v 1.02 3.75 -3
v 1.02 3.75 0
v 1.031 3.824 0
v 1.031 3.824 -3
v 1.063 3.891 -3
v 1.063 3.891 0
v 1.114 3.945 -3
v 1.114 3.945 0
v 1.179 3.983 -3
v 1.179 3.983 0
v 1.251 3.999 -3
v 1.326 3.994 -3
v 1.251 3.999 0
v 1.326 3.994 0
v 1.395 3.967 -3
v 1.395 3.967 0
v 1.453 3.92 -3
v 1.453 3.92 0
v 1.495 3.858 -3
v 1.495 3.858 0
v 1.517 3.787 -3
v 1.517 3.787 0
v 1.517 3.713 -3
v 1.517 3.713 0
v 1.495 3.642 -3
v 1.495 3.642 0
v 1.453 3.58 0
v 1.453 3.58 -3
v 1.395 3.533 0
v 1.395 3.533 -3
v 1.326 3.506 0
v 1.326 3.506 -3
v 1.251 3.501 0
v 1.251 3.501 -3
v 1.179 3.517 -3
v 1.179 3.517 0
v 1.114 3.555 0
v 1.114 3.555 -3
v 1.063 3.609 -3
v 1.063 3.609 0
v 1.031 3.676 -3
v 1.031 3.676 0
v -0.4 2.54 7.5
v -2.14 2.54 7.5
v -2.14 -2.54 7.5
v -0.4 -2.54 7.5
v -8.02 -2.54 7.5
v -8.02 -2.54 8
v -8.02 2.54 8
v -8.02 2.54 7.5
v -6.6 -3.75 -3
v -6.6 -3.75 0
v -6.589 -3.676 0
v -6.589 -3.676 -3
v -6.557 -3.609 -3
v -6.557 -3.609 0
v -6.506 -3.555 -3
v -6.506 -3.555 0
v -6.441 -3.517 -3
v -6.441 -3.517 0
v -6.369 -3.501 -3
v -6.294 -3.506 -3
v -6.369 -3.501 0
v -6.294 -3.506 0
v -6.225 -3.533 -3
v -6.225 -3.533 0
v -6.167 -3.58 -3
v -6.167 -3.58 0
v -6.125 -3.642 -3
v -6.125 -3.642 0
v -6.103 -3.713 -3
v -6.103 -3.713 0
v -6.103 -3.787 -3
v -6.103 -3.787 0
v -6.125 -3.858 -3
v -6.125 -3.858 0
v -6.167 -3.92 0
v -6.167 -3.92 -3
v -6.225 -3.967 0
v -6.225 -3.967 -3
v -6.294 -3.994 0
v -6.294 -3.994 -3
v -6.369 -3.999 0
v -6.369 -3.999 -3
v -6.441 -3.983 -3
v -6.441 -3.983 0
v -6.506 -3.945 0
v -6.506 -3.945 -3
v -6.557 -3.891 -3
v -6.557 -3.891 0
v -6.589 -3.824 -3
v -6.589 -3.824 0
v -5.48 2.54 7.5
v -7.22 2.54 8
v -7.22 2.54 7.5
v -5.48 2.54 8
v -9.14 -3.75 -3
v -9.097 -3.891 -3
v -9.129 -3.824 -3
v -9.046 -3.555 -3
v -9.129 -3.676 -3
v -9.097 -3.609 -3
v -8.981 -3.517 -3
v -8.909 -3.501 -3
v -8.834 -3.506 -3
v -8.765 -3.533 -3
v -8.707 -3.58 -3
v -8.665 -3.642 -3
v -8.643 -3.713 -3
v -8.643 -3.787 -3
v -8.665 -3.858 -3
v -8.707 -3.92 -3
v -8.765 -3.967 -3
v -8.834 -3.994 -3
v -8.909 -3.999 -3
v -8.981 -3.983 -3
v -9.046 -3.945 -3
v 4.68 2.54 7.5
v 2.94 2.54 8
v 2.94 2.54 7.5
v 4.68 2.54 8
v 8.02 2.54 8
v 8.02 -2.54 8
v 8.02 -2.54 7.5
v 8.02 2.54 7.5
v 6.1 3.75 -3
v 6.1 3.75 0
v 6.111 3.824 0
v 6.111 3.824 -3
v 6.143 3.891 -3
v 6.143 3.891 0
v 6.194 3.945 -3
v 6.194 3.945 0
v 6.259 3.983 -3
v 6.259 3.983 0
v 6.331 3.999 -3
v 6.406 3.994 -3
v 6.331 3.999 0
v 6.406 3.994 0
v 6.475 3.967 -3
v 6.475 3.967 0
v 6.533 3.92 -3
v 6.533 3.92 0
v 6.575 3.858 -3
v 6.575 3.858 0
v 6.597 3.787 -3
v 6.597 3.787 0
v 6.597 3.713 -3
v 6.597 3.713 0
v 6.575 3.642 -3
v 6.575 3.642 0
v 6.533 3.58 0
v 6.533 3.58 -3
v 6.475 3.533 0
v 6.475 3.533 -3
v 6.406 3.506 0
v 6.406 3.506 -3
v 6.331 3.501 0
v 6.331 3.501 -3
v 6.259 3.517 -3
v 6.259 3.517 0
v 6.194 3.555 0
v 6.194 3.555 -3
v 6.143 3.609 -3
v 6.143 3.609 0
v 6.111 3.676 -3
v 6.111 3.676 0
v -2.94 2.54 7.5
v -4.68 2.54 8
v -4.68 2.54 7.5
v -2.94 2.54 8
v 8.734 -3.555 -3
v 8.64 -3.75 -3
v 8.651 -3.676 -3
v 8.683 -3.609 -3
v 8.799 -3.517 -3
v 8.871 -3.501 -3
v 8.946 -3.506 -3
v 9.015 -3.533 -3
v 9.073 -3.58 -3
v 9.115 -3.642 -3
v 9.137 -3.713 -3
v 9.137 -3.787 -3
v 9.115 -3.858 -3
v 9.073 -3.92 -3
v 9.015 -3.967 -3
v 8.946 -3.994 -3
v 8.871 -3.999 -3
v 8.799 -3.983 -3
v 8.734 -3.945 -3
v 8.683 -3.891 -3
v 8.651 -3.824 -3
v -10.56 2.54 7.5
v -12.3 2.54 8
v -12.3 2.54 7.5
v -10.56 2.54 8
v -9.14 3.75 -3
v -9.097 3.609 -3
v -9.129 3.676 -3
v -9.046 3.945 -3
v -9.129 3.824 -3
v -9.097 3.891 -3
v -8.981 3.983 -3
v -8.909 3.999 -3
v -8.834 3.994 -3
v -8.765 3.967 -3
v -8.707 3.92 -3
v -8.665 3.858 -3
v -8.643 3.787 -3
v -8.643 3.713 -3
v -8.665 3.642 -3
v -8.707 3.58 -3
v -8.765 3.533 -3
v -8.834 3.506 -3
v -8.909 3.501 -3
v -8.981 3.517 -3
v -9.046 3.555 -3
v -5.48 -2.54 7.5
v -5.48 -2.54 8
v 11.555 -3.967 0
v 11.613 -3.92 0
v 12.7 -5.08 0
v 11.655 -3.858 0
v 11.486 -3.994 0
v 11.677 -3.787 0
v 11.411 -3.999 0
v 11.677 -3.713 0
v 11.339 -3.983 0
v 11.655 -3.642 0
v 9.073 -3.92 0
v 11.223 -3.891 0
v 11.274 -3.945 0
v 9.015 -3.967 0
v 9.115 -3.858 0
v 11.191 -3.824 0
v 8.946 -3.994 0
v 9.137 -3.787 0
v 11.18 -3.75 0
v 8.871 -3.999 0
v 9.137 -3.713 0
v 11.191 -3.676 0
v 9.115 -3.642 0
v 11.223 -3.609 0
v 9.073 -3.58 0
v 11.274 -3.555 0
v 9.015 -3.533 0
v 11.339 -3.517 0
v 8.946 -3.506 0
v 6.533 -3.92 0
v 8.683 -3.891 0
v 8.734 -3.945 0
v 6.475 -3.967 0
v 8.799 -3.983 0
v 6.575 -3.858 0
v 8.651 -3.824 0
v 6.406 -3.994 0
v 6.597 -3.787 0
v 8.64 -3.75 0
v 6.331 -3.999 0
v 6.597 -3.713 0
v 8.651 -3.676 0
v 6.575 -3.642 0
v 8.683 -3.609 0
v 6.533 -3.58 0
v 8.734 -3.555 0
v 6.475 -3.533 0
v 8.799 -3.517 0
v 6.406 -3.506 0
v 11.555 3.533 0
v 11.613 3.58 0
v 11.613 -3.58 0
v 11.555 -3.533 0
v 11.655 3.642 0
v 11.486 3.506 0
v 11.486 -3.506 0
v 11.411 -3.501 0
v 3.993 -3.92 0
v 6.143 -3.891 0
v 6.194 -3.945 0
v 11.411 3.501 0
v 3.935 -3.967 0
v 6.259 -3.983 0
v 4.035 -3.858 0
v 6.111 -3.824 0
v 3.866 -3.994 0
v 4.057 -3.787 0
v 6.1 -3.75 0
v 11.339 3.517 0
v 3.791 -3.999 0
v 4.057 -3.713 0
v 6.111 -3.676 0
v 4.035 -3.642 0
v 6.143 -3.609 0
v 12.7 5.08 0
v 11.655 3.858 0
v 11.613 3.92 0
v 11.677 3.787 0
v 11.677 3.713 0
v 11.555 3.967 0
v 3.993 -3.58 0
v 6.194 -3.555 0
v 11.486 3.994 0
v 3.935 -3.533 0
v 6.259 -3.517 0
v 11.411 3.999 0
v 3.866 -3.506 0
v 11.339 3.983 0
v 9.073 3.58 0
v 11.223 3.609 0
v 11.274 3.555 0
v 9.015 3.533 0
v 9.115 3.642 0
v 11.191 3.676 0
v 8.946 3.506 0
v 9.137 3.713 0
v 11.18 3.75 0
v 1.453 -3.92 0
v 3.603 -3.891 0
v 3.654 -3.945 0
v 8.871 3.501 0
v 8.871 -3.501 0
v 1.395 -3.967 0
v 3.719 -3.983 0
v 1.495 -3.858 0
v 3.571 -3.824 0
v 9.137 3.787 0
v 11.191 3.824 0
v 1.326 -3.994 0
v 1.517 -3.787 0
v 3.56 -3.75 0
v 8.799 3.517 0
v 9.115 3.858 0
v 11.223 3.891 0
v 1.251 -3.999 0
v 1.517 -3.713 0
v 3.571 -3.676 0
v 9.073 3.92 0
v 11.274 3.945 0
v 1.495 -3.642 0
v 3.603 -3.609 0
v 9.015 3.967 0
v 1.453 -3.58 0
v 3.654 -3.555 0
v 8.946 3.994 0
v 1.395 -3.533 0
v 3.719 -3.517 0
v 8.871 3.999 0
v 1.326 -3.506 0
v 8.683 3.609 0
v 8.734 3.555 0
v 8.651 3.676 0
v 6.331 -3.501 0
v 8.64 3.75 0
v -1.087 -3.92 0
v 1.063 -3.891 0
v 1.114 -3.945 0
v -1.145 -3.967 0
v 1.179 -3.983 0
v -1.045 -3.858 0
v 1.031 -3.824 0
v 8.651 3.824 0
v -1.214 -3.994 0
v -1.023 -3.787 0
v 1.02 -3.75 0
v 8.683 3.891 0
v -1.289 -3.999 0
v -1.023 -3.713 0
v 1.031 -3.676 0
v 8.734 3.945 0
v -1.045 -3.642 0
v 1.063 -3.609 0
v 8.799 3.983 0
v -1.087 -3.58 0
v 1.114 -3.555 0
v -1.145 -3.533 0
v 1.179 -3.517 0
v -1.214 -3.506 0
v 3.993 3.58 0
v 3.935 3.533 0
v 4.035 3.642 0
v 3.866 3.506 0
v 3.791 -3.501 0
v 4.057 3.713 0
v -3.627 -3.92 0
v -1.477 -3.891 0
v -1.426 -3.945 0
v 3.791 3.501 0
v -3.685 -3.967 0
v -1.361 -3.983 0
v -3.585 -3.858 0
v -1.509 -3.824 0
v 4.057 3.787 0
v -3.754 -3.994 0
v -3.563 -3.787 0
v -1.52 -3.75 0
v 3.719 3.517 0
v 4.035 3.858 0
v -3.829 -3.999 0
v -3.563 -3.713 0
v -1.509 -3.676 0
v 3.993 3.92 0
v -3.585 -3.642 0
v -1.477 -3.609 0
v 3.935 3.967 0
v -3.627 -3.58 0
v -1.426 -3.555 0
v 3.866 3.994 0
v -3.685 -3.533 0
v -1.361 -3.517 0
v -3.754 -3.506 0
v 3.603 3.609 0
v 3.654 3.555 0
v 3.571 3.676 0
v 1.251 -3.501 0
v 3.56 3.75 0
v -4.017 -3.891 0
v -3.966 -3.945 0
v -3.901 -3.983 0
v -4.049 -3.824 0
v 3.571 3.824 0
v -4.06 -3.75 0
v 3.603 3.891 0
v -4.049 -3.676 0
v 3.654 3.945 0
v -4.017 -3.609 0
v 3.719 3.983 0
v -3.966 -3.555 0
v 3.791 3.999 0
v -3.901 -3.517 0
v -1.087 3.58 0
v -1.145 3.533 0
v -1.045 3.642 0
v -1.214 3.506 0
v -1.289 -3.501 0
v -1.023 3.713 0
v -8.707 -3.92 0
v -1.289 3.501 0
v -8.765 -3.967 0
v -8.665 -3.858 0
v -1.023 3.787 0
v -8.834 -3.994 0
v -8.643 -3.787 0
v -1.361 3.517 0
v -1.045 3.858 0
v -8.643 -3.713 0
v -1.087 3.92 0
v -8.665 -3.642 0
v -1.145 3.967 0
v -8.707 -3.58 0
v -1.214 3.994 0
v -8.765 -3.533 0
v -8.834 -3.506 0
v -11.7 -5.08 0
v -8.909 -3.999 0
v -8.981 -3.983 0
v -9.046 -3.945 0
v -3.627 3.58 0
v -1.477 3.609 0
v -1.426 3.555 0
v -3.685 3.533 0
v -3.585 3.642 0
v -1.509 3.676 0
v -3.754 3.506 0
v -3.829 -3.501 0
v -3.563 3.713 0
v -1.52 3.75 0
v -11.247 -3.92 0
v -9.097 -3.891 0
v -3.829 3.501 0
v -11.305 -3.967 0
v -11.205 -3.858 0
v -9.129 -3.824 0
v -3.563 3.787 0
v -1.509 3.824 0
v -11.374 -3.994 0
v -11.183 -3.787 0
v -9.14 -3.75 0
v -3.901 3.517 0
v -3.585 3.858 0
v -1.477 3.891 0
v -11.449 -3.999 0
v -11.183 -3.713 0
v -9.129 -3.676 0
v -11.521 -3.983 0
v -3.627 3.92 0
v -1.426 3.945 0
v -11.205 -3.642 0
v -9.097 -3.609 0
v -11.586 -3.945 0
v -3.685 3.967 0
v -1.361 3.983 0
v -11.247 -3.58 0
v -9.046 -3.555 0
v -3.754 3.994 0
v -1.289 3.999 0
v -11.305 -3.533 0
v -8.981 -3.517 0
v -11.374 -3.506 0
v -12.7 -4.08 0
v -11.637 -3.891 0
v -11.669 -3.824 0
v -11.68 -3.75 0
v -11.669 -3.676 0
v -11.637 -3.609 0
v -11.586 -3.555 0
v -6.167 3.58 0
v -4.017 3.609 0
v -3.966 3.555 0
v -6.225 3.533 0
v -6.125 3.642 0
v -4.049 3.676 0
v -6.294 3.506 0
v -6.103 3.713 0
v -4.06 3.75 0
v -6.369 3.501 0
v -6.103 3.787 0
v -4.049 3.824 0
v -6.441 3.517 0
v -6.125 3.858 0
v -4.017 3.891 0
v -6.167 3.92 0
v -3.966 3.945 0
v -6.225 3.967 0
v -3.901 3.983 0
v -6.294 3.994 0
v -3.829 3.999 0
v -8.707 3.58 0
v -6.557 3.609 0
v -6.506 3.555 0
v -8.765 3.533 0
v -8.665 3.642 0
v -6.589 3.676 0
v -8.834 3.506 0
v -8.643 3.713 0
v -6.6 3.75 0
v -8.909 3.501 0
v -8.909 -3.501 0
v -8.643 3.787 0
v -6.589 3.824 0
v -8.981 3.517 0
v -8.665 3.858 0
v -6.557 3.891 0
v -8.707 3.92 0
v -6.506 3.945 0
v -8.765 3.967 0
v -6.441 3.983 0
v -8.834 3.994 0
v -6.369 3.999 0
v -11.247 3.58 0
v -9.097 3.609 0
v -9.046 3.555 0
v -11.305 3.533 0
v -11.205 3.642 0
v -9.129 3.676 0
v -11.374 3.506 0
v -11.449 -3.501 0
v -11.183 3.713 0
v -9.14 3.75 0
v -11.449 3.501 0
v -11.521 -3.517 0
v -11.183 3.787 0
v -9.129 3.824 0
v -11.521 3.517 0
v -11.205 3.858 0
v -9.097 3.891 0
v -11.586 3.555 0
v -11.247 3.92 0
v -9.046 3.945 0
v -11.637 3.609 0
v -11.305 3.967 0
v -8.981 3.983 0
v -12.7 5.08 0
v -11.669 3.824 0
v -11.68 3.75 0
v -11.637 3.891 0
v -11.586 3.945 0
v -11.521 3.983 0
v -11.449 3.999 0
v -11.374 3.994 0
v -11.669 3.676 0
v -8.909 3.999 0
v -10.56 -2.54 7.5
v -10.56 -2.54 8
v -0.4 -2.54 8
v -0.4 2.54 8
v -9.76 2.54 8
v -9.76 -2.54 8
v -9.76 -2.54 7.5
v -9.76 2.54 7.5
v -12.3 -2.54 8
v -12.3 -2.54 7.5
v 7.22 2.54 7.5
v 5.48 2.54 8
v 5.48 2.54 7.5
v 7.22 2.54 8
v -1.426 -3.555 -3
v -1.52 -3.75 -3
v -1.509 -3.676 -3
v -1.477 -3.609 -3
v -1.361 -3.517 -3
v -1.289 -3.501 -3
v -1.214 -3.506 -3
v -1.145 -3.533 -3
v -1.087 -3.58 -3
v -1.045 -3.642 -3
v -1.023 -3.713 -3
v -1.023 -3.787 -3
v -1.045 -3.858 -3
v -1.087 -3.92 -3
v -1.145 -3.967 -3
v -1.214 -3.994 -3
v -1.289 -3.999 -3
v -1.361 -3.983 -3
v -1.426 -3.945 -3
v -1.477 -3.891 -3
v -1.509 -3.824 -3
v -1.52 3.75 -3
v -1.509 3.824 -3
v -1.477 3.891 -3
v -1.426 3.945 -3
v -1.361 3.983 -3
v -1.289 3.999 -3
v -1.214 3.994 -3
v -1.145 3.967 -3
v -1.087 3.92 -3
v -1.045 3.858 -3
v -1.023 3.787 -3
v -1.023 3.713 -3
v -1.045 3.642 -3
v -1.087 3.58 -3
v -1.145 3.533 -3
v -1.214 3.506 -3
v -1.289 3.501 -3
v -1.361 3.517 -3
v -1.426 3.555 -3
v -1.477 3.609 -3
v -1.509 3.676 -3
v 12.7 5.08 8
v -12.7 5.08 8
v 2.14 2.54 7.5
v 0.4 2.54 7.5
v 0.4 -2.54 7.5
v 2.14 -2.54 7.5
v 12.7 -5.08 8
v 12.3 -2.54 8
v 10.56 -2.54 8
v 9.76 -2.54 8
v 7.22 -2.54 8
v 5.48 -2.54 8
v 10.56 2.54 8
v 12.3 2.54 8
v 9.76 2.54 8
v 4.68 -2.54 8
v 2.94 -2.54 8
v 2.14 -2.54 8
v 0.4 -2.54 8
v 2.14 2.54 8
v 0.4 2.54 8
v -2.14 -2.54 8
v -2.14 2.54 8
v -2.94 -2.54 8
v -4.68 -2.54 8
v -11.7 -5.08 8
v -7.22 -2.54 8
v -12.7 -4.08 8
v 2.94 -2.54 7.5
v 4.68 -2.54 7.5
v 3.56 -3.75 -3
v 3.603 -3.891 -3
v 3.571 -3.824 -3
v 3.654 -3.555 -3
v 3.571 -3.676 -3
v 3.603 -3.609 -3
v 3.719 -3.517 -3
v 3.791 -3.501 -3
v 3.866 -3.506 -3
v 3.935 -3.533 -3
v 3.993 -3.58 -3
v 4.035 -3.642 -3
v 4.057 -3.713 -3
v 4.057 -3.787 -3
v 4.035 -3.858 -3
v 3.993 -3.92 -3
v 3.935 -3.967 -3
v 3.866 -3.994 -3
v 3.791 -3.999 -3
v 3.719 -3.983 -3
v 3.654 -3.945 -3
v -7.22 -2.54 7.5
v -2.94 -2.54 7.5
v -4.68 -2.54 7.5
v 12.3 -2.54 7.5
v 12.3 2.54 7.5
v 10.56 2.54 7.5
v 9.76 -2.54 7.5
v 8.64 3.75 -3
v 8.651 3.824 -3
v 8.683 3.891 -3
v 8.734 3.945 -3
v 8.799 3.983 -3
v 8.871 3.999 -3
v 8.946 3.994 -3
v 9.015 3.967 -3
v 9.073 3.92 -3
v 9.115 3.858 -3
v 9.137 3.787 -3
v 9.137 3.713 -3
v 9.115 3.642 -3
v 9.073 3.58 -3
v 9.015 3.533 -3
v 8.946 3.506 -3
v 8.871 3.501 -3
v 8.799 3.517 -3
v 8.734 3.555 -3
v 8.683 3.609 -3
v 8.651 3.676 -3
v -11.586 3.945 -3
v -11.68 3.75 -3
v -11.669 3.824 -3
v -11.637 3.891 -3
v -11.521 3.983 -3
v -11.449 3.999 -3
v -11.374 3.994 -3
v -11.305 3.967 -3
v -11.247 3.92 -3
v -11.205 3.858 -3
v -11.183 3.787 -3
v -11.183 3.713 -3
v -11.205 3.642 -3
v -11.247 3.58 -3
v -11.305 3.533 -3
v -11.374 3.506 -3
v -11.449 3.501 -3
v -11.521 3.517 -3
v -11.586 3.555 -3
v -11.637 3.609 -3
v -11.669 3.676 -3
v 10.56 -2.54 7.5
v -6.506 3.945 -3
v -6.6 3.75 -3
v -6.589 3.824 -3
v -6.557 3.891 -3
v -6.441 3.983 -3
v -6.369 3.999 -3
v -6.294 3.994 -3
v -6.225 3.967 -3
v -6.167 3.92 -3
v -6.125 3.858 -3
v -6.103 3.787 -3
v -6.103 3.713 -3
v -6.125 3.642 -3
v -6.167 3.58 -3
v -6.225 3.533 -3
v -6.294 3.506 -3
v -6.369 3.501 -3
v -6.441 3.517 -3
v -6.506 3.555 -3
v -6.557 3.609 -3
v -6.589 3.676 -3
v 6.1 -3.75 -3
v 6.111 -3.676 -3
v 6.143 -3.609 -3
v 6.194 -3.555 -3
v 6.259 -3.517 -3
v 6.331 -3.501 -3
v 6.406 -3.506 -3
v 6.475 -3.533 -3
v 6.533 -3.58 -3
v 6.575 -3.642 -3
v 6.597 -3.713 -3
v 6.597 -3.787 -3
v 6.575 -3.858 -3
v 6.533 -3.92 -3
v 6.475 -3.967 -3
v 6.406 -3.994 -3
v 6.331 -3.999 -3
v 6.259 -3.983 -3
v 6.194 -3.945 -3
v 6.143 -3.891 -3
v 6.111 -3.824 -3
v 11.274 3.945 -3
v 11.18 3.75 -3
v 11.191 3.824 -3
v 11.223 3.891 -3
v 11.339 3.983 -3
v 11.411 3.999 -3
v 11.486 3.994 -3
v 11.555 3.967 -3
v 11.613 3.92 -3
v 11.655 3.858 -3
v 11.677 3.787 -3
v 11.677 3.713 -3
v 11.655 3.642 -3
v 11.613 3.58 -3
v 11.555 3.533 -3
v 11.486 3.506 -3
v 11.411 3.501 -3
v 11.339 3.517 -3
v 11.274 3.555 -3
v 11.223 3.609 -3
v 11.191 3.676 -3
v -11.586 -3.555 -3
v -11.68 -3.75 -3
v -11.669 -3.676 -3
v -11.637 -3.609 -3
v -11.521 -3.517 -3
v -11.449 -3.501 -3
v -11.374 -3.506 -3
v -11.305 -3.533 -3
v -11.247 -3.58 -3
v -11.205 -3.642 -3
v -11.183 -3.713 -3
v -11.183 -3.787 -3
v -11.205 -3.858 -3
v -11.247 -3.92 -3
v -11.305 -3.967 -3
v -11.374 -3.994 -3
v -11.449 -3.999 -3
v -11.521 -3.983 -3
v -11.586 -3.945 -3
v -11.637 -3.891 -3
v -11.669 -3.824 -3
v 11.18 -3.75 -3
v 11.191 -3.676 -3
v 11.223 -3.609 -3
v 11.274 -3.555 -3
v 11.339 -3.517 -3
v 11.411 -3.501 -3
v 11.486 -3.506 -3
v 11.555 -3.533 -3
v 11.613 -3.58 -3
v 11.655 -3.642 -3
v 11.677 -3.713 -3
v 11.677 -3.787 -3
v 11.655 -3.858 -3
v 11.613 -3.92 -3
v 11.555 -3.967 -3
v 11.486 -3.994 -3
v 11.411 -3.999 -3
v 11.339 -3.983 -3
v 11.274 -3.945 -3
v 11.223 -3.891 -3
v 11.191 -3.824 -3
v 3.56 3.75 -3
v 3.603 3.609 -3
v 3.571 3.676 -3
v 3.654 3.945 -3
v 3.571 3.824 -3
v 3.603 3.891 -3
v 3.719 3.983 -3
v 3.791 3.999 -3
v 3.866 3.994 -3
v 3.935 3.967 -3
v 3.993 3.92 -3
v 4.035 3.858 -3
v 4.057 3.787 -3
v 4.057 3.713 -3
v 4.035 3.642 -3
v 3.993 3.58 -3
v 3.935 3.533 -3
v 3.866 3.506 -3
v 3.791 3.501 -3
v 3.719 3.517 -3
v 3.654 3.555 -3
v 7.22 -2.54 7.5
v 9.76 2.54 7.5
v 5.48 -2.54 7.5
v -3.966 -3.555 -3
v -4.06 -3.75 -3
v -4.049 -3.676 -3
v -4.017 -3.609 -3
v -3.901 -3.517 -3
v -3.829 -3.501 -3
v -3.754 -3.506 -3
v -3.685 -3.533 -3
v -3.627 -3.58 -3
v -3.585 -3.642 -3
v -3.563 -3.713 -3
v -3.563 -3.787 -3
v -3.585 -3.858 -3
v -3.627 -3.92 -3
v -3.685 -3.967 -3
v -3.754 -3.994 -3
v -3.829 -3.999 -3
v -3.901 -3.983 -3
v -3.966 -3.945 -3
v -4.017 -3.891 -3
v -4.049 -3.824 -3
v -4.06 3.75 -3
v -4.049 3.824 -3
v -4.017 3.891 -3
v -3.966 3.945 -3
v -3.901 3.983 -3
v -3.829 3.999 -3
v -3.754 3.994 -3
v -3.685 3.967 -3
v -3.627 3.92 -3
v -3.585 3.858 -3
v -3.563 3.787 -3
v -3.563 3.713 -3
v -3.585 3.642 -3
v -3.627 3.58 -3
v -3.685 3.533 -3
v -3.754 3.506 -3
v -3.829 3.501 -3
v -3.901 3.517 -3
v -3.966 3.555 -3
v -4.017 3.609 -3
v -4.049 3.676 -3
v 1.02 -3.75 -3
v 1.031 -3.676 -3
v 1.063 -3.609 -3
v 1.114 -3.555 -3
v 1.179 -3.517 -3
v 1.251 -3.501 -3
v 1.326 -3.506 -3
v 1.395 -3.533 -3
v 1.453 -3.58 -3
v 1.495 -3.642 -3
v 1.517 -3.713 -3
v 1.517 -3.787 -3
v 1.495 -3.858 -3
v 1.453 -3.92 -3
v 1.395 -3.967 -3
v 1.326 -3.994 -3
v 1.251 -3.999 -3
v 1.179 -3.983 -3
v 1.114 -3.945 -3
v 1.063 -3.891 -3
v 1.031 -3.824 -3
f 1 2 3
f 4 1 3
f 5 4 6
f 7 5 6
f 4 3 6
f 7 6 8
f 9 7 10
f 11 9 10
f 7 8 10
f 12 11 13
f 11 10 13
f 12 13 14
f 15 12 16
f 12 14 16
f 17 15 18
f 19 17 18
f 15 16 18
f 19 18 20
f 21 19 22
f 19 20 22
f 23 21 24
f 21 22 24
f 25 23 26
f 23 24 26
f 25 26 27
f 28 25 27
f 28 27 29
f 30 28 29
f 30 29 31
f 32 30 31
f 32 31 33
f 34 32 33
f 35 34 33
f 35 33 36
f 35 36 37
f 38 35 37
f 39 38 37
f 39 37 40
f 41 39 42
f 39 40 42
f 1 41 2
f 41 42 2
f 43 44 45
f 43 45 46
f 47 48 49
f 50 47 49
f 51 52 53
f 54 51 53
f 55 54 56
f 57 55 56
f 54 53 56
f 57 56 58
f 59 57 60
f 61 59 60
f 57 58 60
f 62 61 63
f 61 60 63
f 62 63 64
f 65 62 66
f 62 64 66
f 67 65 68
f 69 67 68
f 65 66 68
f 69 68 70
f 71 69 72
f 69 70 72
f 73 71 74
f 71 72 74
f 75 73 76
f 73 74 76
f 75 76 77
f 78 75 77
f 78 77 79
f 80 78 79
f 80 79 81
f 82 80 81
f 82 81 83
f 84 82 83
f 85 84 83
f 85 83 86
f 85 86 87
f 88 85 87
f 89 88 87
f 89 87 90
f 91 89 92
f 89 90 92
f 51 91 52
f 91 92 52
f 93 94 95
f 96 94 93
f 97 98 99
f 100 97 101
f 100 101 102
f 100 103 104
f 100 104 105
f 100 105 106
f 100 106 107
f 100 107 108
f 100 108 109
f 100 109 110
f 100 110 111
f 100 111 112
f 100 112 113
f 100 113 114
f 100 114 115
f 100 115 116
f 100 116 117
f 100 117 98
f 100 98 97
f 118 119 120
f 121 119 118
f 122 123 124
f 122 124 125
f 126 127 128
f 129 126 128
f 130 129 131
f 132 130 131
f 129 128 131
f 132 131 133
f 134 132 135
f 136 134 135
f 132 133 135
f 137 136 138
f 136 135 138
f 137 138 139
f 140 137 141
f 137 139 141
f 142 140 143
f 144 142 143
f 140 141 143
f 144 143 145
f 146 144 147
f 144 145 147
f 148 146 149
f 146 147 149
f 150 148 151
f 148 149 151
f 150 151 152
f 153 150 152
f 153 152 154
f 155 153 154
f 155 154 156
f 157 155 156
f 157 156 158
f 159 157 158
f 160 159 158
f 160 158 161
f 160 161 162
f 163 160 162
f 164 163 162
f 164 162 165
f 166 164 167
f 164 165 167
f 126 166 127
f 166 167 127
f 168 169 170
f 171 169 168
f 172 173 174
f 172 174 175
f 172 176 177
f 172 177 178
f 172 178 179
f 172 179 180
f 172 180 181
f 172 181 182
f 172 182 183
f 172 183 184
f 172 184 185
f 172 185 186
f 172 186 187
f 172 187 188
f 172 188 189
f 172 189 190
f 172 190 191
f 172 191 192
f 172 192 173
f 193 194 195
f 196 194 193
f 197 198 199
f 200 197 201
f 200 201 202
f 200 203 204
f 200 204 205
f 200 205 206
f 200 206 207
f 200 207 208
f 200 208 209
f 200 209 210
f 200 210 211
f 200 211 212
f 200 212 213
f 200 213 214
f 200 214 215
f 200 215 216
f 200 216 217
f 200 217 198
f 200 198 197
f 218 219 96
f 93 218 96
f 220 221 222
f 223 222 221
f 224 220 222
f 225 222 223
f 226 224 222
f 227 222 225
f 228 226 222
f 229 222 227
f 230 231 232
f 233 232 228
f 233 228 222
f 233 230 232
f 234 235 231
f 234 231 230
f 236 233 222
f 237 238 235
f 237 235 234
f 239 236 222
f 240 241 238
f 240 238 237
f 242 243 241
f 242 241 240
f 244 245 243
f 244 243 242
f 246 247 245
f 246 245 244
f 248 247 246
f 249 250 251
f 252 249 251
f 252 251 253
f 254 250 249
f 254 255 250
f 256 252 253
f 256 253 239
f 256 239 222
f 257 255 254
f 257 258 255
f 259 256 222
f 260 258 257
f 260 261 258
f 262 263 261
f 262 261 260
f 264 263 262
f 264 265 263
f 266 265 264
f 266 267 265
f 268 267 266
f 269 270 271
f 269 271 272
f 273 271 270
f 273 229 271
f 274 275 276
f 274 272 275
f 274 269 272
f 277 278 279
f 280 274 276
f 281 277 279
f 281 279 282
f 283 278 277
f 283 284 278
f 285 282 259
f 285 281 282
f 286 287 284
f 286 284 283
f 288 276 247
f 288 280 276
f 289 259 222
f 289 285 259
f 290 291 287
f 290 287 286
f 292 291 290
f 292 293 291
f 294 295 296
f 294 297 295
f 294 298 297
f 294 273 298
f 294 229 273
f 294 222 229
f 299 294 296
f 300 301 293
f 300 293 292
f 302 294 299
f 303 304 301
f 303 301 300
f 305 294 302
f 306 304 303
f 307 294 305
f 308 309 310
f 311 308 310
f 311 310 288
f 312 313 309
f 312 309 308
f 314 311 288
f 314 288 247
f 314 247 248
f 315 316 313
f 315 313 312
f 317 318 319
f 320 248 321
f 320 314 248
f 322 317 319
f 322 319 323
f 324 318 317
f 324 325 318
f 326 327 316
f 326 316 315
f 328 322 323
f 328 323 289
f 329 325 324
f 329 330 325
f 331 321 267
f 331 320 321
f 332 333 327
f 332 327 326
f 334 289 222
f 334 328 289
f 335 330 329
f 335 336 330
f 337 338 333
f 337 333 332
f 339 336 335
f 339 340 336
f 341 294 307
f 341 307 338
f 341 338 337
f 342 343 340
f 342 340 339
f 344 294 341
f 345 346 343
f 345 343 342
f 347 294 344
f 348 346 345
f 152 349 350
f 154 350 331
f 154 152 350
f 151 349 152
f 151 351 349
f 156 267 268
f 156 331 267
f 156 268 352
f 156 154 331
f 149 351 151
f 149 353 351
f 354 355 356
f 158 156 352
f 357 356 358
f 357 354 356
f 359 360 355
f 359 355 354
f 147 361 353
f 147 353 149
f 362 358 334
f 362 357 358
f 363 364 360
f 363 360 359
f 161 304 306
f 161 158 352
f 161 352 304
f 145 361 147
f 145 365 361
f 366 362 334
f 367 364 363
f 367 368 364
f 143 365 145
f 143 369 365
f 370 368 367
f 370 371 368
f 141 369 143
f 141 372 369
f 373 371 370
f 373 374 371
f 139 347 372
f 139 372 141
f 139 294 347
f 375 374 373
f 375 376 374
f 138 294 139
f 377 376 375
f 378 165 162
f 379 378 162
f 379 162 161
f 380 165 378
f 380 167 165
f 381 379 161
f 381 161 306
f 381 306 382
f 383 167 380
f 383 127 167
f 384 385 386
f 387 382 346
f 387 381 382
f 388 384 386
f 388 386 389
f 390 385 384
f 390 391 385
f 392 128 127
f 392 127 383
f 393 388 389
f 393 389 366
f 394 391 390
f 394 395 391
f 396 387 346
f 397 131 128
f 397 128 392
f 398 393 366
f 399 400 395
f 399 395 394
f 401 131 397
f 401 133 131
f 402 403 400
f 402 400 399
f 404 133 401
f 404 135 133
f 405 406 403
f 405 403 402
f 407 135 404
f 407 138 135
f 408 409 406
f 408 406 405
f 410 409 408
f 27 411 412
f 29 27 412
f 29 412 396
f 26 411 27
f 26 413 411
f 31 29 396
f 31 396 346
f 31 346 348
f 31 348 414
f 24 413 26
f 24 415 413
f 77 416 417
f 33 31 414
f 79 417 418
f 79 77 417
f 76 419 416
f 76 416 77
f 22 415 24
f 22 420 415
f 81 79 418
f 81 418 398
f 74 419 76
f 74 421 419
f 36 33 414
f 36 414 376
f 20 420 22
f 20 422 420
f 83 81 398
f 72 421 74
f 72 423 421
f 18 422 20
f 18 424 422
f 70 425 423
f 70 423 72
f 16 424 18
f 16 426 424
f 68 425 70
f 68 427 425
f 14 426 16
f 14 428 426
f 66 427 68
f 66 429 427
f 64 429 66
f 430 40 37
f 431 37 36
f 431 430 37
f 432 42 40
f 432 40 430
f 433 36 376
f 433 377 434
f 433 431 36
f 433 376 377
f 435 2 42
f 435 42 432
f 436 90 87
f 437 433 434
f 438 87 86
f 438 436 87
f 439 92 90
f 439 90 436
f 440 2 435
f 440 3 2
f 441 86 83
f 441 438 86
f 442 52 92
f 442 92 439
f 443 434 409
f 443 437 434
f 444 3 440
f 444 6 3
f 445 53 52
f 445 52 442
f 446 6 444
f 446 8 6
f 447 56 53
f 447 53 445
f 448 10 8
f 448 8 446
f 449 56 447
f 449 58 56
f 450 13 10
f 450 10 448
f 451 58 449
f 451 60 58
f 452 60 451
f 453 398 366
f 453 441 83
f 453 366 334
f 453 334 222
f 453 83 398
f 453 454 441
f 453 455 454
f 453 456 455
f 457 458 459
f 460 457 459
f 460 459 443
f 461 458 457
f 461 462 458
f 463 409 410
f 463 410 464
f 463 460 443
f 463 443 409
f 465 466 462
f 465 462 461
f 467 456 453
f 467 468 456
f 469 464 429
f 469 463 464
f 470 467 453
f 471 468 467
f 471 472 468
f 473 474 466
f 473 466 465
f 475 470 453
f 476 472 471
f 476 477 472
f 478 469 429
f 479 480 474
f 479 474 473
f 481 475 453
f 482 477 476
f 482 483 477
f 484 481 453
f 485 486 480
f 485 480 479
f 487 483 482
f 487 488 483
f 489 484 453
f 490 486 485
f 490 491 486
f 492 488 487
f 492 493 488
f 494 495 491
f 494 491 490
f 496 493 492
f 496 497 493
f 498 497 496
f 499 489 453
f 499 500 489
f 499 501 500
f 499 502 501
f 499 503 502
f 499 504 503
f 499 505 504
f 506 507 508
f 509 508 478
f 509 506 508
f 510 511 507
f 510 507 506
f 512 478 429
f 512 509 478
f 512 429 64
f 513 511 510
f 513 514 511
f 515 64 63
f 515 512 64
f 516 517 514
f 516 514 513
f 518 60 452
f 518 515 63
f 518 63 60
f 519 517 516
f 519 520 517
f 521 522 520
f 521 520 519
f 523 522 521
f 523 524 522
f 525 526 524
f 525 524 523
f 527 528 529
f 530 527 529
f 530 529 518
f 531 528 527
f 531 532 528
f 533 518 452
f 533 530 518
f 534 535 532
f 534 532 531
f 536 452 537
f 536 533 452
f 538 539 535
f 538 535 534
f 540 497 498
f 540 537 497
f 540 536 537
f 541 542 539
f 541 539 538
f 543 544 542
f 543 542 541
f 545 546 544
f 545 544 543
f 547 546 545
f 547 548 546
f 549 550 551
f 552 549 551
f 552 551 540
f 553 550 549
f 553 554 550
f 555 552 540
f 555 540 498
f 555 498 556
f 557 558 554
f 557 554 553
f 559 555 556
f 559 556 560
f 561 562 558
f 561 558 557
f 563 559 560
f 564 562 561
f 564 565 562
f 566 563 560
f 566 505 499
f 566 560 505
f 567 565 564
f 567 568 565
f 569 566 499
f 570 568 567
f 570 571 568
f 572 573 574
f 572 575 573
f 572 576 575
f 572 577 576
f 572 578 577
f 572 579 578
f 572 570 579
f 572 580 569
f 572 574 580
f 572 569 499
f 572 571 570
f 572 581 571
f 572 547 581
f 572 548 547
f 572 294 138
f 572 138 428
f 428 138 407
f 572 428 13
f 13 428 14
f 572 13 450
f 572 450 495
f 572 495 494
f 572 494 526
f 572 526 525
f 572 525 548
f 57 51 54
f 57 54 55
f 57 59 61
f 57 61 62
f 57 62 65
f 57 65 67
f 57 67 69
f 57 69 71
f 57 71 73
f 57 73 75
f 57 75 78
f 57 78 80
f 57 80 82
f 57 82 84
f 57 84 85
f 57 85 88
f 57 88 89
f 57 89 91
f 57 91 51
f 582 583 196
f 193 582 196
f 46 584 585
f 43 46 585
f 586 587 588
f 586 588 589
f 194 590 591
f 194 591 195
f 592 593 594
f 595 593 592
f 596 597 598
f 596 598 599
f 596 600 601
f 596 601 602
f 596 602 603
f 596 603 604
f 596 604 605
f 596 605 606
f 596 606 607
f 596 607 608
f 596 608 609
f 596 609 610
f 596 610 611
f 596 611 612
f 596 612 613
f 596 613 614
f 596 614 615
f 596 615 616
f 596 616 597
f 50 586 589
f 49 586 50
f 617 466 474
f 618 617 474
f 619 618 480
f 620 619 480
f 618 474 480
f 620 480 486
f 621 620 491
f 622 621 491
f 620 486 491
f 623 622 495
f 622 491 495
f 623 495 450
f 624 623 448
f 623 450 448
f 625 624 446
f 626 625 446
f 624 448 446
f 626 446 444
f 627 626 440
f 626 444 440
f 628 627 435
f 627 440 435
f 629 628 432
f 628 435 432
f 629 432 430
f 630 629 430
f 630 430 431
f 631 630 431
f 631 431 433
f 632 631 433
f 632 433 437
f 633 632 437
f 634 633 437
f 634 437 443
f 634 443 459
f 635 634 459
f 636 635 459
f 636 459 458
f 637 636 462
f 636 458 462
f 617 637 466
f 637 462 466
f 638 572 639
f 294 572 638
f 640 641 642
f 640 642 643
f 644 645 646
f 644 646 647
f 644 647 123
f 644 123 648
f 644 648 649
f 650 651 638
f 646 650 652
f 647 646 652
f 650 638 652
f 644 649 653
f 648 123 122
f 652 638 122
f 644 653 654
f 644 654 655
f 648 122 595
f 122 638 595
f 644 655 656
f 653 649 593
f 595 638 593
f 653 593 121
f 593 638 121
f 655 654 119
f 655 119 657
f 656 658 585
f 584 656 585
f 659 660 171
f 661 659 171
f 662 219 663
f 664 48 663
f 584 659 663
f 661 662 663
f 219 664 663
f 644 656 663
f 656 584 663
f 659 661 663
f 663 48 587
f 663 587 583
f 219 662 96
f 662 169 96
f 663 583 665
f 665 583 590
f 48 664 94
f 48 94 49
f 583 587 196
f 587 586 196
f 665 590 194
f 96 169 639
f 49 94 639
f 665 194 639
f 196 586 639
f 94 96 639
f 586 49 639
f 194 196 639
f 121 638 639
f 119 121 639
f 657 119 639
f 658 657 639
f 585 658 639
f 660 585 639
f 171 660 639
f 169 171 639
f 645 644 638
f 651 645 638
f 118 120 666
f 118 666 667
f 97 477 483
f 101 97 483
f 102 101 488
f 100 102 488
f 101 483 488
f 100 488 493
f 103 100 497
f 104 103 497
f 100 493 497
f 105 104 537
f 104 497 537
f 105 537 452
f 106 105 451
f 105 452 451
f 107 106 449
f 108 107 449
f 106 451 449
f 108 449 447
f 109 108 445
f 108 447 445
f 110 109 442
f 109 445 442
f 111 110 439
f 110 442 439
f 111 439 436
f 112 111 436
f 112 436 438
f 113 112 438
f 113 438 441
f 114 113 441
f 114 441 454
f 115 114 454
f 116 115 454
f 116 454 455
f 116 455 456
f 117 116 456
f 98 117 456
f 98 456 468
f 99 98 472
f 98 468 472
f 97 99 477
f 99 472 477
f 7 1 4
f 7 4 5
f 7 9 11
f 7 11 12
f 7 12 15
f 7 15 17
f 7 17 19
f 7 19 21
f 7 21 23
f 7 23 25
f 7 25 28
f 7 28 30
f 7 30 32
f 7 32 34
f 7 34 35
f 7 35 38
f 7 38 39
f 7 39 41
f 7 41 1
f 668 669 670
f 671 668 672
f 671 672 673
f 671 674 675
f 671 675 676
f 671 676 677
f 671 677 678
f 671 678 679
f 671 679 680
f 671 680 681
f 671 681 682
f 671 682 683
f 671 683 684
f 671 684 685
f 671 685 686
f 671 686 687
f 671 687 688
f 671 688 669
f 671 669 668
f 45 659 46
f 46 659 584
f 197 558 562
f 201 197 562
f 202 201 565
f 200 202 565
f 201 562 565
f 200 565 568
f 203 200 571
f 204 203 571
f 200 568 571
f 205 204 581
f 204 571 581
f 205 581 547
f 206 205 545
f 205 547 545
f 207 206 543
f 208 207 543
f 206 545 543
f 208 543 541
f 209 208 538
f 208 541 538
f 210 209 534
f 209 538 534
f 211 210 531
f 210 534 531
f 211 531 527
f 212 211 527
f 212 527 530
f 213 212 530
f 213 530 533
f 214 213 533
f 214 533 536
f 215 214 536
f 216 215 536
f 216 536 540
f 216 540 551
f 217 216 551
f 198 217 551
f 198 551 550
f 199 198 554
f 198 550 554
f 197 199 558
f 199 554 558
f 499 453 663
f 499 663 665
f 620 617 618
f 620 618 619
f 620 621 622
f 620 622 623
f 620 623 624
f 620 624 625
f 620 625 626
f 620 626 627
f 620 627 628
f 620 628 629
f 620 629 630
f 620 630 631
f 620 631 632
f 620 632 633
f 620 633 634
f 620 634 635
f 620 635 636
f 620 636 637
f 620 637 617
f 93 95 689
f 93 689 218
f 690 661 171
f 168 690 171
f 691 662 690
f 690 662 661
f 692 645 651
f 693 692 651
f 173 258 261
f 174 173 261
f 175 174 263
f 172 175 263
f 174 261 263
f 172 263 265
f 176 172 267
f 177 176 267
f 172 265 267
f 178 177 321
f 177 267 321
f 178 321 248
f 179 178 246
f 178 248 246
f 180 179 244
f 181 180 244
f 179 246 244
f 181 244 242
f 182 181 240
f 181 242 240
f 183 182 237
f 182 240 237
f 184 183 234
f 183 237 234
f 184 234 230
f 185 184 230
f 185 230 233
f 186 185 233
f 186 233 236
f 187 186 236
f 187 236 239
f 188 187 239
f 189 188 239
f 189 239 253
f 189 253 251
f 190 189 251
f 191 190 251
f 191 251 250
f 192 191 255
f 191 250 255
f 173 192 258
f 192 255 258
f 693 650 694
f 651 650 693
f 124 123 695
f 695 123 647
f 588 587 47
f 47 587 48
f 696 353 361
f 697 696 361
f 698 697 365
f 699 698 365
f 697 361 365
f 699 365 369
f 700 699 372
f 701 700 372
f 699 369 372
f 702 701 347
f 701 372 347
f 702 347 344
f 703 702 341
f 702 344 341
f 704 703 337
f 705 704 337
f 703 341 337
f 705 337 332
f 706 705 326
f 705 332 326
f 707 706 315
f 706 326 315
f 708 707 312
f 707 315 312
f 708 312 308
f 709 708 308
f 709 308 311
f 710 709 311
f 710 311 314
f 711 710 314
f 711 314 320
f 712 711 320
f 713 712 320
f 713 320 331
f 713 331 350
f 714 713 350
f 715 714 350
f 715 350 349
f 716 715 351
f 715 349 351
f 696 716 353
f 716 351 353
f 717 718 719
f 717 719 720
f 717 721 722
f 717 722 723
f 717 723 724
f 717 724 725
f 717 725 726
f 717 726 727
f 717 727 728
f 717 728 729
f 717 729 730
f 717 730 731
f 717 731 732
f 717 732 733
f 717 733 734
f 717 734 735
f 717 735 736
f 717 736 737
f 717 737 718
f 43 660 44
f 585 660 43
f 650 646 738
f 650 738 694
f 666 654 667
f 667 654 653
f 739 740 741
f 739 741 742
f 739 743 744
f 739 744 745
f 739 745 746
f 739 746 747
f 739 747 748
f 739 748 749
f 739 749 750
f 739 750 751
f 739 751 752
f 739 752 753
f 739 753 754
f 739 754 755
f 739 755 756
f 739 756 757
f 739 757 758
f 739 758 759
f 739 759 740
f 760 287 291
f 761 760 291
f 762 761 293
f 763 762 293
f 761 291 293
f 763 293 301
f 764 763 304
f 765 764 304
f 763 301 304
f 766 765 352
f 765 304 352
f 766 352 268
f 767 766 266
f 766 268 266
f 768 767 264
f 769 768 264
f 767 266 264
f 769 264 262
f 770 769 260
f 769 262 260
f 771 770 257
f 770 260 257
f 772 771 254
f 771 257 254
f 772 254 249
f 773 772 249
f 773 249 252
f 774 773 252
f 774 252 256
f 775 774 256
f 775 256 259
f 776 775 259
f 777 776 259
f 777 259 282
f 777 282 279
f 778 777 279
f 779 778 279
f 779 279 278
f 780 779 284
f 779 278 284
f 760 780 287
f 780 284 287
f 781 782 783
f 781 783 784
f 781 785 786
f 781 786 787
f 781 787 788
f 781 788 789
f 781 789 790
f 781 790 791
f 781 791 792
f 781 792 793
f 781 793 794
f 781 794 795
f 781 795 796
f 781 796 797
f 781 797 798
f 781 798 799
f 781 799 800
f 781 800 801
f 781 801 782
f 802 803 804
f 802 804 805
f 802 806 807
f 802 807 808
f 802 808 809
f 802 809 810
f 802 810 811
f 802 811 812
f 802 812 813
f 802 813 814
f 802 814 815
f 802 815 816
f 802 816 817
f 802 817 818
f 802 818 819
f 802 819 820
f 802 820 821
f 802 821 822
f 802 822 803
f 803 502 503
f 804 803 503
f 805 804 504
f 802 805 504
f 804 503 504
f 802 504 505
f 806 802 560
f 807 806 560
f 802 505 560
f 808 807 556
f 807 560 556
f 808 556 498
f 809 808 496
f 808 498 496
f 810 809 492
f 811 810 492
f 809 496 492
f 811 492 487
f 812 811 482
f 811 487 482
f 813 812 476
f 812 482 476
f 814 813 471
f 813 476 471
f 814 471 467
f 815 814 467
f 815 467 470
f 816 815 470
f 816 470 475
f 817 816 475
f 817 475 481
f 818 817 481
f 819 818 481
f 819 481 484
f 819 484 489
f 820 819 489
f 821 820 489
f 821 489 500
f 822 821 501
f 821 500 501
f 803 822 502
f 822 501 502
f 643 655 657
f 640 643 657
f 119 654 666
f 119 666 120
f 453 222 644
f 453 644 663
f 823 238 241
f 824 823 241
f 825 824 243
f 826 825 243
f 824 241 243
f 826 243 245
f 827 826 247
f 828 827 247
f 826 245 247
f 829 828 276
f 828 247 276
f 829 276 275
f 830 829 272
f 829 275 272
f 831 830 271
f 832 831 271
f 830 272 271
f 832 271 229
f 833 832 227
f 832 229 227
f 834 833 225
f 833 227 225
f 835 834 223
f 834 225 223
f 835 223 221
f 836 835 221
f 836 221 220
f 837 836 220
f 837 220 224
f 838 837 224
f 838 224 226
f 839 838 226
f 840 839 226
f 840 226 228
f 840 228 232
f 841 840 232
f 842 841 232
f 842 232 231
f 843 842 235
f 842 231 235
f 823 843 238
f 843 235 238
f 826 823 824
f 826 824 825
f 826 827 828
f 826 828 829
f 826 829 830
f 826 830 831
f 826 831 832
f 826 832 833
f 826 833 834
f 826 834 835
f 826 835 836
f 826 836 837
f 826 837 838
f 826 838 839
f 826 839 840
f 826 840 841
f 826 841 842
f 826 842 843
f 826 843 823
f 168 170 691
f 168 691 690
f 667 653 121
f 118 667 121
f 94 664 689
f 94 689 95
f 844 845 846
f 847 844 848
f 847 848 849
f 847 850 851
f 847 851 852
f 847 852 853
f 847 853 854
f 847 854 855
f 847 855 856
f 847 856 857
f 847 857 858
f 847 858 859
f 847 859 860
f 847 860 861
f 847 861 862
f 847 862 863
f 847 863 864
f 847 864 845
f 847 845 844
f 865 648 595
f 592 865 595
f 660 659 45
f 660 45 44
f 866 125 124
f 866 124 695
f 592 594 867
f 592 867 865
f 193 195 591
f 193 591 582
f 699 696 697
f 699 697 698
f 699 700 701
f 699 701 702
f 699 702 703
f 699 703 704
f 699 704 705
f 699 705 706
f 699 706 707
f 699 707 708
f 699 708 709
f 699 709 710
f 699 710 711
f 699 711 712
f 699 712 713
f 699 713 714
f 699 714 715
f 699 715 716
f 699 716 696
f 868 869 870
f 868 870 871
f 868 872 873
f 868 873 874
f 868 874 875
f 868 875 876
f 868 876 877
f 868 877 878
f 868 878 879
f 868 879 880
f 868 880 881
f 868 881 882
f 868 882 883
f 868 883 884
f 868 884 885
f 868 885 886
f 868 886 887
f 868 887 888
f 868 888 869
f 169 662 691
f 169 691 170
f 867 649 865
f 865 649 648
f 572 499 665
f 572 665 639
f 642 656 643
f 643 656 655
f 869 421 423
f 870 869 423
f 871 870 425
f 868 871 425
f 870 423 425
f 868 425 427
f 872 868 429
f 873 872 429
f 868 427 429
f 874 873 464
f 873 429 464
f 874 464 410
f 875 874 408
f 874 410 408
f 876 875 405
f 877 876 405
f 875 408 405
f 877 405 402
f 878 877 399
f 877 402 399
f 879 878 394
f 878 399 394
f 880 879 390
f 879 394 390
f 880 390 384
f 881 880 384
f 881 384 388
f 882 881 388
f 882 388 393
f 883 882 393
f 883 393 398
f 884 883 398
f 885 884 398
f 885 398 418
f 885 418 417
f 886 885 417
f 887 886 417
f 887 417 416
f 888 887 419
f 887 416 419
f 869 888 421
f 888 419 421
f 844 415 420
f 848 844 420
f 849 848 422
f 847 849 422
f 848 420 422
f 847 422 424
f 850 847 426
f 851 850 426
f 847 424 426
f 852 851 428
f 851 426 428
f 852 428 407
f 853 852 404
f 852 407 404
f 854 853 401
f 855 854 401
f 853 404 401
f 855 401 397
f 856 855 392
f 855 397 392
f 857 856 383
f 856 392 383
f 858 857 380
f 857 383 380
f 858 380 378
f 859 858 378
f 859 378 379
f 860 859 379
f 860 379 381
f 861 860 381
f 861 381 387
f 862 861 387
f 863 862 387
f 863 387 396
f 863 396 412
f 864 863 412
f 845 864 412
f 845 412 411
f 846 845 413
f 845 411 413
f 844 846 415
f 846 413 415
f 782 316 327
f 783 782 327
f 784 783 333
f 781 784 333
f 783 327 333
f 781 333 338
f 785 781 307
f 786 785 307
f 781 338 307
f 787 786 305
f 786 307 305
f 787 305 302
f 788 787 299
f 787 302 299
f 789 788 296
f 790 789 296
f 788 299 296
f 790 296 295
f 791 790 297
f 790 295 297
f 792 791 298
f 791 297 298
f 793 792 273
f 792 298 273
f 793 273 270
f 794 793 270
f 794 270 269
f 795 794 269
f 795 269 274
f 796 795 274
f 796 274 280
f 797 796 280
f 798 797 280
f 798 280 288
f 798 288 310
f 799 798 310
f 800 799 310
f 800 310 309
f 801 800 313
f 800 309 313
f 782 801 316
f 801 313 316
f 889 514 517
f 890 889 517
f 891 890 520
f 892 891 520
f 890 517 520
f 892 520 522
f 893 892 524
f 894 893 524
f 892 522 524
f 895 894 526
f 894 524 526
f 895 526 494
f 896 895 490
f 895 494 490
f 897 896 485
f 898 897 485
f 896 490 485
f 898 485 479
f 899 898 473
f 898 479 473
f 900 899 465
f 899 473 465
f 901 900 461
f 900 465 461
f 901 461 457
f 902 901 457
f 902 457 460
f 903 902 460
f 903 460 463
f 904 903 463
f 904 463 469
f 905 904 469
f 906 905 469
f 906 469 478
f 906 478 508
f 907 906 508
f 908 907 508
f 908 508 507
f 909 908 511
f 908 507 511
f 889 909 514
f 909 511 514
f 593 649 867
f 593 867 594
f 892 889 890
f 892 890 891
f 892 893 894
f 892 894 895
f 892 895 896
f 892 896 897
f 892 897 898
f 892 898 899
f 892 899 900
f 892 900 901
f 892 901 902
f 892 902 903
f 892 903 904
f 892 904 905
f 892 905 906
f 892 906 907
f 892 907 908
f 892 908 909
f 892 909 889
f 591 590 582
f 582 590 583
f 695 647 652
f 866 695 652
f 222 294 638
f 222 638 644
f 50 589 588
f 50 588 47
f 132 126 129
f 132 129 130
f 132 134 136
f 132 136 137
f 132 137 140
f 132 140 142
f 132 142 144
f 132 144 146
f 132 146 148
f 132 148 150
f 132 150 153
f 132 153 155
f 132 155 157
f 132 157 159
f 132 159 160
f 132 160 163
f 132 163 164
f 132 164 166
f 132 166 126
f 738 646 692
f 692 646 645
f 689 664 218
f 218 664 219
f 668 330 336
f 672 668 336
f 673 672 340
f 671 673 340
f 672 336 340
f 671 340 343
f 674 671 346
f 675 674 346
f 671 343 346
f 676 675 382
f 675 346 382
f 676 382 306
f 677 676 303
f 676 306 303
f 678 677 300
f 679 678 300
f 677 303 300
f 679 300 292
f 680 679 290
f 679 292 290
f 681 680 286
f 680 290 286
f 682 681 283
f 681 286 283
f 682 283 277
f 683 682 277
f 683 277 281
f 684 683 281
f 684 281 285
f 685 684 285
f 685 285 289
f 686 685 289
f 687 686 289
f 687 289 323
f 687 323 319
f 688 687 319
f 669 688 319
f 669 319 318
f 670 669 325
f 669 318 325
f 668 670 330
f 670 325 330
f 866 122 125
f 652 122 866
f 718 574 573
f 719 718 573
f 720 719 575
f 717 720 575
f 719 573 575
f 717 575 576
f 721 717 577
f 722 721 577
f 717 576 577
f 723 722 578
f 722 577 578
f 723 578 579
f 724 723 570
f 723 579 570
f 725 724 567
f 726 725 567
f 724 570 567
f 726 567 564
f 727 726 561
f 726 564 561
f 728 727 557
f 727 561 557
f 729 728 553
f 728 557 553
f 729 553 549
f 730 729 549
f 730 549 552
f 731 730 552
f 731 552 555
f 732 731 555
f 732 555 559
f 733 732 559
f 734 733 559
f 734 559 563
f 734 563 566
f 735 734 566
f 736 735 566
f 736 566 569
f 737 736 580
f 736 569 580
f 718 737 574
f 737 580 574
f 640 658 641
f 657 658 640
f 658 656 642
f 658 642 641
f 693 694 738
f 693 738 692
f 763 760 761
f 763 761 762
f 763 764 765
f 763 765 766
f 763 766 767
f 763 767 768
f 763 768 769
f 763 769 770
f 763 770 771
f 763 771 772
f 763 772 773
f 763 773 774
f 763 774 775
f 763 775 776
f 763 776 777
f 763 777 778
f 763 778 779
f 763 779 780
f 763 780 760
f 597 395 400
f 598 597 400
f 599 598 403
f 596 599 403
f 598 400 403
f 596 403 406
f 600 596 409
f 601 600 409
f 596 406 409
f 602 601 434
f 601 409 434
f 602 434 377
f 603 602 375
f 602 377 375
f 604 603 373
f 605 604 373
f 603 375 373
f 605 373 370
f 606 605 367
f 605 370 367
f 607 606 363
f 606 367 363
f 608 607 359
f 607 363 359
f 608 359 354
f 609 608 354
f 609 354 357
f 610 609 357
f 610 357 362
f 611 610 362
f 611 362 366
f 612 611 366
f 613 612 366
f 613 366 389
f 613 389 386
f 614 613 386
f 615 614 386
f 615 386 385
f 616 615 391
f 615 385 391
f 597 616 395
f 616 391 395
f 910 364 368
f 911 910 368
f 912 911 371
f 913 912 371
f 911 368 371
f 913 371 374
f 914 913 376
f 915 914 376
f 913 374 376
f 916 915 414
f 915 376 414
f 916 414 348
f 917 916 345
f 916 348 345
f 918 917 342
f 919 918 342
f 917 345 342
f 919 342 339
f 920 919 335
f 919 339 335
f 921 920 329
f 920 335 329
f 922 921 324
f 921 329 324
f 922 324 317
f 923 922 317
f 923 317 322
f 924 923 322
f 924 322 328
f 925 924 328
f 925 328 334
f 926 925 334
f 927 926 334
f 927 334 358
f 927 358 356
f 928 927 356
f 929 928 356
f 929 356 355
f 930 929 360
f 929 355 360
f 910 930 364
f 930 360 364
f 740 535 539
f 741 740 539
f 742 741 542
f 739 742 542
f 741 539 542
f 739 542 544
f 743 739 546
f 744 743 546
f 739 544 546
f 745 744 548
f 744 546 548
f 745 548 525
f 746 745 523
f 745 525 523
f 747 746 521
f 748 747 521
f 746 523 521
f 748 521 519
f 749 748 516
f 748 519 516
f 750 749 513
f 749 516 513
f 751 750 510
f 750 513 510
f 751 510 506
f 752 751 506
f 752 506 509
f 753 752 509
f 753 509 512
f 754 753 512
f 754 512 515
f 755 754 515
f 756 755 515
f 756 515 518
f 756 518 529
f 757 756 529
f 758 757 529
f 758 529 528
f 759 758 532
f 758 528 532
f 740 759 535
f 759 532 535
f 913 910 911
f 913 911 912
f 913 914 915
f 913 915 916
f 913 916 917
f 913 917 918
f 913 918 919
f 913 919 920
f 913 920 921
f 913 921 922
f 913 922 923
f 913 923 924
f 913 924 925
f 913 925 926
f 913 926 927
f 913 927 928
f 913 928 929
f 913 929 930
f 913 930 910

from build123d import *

# Parameters (mm, degrees)
SALIENTE_EXTRUIR1_DEPTH = 8
CROQUIS3_R              = 0.25
SALIENTE_EXTRUIR2_DEPTH = 3
MATRIZL1_COUNT          = 2
MATRIZL1_PITCH          = 12.7
MATRIZL1_COUNT_DIR2     = 2
MATRIZL1_PITCH_DIR2     = 7.5
CROQUIS4_W              = 1.74
CROQUIS4_H              = 5.08
CORTAR_EXTRUIR1_DEPTH   = 0.5
MATRIZL2_COUNT          = 10
MATRIZL2_PITCH          = 2.54


with BuildPart() as part:
    # Croquis1 → Saliente-Extruir1 (new body)
    with BuildSketch(Plane.XY):
        Polygon((-11.7, -5.08), (-12.7, -4.08), (-12.7, 5.08), (12.7, 5.08), (12.7, -5.08), align=None)
    extrude(amount=SALIENTE_EXTRUIR1_DEPTH)

    # Croquis3 → Saliente-Extruir2 (add)
    with BuildSketch(Plane(origin=(0, 0, 0), x_dir=(-1, 0, 0), z_dir=(0, 0, -1))):
        with Locations((-11.43, 3.75)):
            Circle(CROQUIS3_R)
        with Locations((-8.89, 3.75)):
            Circle(CROQUIS3_R)
        with Locations((-6.35, 3.75)):
            Circle(CROQUIS3_R)
        with Locations((-3.81, 3.75)):
            Circle(CROQUIS3_R)
        with Locations((-1.27, 3.75)):
            Circle(CROQUIS3_R)
    saliente_extruir2 = extrude(amount=SALIENTE_EXTRUIR2_DEPTH)

    # MatrizL1: Saliente-Extruir2 2 × 2
    with Locations(*[(-i * MATRIZL1_PITCH, -j * MATRIZL1_PITCH_DIR2, 0) for i in range(MATRIZL1_COUNT) for j in range(MATRIZL1_COUNT_DIR2) if (i, j) != (0, 0)]):
        add(saliente_extruir2)

    # Croquis4 → Cortar-Extruir1 (cut)
    with BuildSketch(Plane.XY.offset(8)):
        with Locations((11.43, 0)):
            Rectangle(CROQUIS4_W, CROQUIS4_H)
    cortar_extruir1 = extrude(amount=-CORTAR_EXTRUIR1_DEPTH, mode=Mode.SUBTRACT)

    # MatrizL2: Cortar-Extruir1 ×10
    with Locations(*[(-i * MATRIZL2_PITCH, 0, 0) for i in range(1, MATRIZL2_COUNT)]):
        add(cortar_extruir1, mode=Mode.SUBTRACT)


solid = part.part
